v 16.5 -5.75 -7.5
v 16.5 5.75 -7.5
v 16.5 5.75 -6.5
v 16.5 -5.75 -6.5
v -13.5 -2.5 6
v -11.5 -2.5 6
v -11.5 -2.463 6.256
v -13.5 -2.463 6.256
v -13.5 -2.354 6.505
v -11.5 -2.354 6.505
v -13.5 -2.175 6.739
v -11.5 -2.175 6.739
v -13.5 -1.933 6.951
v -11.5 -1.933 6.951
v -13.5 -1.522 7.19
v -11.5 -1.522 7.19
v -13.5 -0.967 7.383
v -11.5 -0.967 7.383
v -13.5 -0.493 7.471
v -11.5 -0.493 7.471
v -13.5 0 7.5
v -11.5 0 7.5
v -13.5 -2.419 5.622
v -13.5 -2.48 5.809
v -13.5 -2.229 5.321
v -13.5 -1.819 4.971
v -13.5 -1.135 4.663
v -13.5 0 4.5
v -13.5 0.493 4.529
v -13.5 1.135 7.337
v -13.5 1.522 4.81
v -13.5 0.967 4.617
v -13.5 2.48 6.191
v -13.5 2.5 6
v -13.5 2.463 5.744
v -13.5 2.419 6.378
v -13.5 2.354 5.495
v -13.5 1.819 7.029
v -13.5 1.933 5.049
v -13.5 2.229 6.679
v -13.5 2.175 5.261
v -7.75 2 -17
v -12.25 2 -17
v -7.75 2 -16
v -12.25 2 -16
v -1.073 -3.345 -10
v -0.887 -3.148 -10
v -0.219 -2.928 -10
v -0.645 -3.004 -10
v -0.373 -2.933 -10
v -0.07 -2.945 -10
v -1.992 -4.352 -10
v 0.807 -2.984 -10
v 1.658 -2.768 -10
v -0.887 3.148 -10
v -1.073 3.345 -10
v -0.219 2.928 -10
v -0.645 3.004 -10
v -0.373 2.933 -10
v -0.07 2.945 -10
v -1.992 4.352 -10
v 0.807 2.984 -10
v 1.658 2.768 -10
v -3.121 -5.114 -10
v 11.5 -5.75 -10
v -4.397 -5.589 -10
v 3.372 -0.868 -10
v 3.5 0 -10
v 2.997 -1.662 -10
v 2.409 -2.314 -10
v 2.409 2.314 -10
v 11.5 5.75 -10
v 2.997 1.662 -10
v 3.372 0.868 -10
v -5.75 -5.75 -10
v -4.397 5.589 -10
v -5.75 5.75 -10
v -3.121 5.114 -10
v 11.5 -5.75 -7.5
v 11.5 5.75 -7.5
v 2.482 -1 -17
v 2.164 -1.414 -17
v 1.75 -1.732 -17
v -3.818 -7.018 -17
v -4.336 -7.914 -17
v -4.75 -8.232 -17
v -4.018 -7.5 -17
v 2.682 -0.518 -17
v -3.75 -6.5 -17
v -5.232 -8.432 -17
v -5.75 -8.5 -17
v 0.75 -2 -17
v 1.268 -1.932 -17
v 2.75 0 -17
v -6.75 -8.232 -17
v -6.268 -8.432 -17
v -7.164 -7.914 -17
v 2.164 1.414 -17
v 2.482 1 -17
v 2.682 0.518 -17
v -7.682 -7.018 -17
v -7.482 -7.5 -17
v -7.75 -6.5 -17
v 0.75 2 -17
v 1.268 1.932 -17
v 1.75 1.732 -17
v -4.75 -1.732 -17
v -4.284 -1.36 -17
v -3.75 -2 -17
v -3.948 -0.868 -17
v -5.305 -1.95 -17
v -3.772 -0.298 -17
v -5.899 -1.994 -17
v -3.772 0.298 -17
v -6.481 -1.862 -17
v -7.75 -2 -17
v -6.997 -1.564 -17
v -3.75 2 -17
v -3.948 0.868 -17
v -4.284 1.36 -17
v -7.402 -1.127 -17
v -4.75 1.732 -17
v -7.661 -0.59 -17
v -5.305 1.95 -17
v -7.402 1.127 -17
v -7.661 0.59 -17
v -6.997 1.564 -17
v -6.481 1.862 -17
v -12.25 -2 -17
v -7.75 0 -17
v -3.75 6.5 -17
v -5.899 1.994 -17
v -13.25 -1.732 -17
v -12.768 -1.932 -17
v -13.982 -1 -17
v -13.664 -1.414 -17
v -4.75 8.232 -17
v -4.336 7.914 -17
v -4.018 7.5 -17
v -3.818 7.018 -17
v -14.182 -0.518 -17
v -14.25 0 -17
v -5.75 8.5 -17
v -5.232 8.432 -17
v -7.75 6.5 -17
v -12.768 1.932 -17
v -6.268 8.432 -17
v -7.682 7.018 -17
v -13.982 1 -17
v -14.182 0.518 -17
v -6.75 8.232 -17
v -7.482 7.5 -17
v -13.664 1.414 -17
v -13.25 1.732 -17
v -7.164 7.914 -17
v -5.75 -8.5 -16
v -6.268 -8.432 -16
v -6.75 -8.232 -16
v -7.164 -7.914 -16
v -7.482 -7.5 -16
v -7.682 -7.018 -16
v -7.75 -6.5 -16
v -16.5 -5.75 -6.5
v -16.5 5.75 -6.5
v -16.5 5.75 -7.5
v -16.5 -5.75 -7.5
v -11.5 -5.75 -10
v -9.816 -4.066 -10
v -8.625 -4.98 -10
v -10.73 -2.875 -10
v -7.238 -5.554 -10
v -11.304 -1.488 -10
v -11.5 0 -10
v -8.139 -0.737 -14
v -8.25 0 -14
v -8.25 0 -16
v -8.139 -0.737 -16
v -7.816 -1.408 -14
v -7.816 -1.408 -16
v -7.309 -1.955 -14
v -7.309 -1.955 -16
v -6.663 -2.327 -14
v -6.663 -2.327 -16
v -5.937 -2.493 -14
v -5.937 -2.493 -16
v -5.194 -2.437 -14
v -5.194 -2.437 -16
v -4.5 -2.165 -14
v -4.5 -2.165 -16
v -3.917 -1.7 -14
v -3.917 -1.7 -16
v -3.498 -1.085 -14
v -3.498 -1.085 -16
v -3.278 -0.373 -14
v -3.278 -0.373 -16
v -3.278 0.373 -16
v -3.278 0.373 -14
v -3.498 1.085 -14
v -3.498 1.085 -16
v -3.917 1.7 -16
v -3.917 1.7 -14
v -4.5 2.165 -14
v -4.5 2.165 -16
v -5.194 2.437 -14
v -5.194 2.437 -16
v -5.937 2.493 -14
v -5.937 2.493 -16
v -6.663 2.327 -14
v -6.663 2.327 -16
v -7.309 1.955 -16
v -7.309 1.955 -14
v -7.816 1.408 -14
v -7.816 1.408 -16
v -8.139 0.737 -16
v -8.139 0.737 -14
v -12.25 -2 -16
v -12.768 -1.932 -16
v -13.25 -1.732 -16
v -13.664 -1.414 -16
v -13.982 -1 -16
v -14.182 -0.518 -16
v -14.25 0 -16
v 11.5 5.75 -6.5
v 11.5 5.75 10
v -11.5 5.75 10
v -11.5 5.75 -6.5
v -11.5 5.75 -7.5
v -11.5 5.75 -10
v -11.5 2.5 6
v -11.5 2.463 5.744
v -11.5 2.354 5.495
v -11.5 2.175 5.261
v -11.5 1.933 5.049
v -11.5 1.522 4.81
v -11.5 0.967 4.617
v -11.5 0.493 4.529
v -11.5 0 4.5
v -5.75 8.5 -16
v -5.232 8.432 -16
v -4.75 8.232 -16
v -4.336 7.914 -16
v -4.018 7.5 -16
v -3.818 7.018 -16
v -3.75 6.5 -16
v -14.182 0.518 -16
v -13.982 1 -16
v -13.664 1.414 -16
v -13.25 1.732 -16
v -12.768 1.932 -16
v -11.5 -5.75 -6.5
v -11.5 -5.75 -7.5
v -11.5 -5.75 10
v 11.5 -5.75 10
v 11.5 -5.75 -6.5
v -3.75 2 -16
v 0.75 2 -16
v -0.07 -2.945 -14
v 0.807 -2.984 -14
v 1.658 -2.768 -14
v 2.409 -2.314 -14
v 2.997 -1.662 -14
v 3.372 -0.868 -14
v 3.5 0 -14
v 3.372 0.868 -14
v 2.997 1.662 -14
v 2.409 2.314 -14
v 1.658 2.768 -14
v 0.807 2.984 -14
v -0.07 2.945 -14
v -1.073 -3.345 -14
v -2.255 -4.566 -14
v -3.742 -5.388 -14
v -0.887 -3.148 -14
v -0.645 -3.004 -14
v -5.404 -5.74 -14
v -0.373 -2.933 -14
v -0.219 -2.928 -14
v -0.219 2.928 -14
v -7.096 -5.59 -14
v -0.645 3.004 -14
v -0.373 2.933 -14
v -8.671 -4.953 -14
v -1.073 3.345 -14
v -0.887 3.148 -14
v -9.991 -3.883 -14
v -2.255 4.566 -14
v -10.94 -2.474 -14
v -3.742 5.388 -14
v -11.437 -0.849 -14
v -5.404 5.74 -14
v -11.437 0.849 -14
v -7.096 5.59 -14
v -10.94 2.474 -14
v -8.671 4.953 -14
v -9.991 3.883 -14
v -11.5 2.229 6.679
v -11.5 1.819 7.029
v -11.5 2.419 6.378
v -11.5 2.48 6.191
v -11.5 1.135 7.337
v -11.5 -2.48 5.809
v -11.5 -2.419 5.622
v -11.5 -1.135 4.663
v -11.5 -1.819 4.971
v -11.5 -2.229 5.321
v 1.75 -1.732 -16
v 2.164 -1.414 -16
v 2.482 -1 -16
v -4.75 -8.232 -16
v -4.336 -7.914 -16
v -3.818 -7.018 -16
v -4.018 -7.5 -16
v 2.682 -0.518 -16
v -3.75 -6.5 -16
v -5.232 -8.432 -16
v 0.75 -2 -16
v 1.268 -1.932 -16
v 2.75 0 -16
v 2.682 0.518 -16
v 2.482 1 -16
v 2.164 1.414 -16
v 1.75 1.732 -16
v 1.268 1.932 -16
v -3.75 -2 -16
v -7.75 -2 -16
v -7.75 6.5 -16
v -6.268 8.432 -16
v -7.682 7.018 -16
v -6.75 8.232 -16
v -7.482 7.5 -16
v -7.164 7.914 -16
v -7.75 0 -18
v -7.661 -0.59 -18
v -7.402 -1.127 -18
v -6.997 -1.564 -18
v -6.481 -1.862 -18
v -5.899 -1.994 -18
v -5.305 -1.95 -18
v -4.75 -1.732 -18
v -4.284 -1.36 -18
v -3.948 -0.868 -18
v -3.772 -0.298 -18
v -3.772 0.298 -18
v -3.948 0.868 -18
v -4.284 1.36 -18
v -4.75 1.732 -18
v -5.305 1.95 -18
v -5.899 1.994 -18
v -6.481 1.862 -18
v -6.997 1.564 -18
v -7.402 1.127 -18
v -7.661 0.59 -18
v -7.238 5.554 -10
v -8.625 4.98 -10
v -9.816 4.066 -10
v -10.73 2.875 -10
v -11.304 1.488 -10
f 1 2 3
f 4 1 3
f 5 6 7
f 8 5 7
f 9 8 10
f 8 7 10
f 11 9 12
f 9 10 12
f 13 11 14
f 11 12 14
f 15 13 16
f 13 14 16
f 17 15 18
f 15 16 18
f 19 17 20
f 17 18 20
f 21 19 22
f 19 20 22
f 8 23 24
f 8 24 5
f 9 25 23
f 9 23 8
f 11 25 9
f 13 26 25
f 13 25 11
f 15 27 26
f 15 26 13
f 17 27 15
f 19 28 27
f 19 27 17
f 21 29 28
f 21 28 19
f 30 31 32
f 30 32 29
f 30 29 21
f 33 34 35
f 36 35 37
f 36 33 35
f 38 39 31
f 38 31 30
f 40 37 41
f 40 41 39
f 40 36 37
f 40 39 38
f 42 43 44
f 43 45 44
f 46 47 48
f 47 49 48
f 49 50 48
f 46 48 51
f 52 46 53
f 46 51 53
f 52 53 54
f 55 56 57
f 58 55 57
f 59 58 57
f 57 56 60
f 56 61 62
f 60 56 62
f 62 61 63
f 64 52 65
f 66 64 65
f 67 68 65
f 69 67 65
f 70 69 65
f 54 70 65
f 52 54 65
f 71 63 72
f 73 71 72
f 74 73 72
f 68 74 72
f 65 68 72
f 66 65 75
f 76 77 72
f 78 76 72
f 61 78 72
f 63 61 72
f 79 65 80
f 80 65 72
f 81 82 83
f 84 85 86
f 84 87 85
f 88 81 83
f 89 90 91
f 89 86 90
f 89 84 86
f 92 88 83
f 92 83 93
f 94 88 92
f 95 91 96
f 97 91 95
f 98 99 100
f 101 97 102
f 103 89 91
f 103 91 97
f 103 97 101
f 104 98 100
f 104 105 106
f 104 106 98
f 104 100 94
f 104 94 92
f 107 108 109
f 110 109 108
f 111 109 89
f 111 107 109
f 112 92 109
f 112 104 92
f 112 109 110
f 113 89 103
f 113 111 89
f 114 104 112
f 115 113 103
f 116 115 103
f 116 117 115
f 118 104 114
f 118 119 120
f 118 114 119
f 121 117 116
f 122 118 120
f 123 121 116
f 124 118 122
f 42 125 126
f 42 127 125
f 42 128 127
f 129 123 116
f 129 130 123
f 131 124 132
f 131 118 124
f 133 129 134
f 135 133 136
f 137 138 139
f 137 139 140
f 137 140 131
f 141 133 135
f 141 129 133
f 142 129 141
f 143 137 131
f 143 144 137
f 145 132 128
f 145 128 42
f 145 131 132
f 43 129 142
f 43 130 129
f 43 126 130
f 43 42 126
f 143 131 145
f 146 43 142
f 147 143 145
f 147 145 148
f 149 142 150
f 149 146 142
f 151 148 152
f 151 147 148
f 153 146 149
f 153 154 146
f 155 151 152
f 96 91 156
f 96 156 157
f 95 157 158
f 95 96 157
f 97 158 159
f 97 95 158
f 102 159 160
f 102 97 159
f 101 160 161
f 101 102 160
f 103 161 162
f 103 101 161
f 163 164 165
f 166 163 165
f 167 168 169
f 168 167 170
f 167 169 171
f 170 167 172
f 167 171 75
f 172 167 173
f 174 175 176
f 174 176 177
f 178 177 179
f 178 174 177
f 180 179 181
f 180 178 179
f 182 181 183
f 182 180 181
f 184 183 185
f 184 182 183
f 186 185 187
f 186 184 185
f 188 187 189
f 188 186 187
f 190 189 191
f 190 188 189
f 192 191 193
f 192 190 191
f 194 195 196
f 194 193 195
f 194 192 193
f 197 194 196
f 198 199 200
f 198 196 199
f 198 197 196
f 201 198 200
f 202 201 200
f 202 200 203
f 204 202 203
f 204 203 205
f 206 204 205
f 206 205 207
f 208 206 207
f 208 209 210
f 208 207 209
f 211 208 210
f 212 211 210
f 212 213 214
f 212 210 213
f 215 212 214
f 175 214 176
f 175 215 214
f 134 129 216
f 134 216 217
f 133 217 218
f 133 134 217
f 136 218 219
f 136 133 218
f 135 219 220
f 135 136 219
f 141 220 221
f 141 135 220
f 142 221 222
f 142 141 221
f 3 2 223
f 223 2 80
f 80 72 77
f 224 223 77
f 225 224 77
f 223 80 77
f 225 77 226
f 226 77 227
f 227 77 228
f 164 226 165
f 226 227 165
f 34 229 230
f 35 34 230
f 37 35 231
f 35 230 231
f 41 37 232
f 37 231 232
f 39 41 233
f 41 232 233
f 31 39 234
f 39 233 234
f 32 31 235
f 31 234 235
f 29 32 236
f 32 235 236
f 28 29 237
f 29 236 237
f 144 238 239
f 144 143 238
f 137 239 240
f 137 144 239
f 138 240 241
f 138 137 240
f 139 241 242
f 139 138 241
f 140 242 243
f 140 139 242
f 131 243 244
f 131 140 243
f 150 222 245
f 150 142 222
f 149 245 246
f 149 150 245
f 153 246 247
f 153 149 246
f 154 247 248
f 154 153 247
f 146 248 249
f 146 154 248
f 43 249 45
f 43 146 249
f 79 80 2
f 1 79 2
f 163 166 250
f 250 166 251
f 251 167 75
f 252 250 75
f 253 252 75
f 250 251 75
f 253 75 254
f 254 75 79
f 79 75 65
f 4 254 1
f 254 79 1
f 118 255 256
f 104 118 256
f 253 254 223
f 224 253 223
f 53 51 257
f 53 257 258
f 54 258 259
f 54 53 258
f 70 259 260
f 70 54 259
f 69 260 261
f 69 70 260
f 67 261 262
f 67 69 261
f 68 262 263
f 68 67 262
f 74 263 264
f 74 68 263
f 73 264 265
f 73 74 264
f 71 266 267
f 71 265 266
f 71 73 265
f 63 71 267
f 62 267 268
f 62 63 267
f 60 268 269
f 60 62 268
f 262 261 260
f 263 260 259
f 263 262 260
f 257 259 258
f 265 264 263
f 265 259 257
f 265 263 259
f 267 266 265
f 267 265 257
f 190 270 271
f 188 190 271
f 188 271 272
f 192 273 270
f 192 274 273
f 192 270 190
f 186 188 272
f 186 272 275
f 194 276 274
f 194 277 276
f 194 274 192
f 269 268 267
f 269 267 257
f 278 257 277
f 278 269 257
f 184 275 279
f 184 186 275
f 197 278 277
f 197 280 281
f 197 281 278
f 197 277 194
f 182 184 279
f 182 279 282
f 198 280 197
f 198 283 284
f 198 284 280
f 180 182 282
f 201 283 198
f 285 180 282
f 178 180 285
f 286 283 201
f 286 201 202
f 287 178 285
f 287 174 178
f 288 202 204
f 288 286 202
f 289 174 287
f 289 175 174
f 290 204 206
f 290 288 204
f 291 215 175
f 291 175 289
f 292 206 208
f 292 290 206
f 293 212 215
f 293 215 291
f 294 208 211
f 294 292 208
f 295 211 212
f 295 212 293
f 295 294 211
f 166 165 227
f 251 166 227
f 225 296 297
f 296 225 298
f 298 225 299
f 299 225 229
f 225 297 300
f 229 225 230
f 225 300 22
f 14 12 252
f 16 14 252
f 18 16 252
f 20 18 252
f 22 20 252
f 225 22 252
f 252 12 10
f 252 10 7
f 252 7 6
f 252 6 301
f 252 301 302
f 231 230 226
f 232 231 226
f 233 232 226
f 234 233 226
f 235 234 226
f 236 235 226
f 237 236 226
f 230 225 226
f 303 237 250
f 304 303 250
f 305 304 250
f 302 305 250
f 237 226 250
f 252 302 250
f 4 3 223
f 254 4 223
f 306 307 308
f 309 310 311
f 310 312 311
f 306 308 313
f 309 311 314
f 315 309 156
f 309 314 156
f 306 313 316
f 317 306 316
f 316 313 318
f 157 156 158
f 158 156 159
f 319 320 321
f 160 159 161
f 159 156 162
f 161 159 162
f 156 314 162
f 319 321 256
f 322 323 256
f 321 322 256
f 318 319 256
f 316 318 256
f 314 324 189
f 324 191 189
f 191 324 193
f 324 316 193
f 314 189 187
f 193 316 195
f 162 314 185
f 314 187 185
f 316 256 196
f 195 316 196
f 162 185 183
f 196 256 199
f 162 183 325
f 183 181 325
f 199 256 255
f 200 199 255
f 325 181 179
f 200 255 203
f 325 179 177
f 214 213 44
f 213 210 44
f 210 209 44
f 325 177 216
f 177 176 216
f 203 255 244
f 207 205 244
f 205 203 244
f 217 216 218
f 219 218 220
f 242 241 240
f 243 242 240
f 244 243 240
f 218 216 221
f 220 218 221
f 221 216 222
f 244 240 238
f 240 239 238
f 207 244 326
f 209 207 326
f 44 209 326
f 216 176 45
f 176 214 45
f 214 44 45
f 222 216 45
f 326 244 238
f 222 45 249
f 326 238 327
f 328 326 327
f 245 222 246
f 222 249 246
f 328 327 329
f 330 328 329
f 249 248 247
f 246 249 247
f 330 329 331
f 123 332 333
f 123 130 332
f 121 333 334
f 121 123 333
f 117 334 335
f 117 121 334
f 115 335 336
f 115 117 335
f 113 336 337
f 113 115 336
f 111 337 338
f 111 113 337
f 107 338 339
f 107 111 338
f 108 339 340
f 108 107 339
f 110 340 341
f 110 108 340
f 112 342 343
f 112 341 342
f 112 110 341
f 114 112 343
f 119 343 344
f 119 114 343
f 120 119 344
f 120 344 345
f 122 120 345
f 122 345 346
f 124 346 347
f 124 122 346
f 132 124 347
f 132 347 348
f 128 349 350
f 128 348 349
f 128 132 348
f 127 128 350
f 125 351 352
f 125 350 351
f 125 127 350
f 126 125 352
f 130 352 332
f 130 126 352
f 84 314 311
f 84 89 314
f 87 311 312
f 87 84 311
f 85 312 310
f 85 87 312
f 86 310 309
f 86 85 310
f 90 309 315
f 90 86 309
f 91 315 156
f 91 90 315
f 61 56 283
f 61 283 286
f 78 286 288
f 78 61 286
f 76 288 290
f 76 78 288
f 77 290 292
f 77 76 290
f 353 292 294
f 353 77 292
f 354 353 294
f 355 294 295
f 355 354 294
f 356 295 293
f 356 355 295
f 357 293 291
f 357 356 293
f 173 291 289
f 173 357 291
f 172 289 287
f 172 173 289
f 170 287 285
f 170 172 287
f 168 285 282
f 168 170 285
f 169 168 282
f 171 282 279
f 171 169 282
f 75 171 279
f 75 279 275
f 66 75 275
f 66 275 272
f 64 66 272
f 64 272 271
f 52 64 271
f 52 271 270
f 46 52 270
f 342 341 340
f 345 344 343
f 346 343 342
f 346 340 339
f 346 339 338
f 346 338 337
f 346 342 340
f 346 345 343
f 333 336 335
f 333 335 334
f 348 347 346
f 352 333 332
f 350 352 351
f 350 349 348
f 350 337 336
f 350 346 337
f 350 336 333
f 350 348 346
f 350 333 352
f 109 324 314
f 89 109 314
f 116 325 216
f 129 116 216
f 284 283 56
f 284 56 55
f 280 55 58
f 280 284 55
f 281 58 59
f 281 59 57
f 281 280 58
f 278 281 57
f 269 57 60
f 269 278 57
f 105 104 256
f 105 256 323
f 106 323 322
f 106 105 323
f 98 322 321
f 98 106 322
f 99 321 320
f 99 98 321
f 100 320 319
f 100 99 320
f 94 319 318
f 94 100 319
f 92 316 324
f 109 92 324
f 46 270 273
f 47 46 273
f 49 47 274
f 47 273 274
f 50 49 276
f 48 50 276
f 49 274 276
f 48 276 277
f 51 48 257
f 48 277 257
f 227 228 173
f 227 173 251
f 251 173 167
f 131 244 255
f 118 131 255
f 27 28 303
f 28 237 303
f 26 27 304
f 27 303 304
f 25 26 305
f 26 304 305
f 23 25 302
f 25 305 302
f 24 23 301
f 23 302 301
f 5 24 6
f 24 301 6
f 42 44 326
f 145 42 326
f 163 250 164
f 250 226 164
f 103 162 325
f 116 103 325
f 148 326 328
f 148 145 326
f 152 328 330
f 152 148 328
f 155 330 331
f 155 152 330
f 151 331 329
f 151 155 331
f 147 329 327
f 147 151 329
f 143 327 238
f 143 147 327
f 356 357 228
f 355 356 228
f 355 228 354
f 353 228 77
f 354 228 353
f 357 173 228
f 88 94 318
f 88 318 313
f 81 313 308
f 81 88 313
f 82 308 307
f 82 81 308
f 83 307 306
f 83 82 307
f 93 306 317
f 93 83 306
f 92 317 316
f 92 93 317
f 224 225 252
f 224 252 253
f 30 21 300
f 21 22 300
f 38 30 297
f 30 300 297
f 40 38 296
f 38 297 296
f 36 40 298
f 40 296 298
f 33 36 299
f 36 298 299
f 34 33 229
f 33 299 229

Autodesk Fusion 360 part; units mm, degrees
sketch "Skizze1" plane through (0, 0, 0) normal (0, 0, 1) x (1, 0, 0)
  line L0 (11.5, 5.75) -> (-11.5, 5.75)
  line L1 (-11.5, 5.75) -> (-11.5, -5.75)
  line L2 (-11.5, -5.75) -> (11.5, -5.75)
  line L3 (11.5, -5.75) -> (11.5, 5.75)
  line L4 (11.5, 5.75) -> (-11.5, -5.75) construction
  line L5 (-11.5, 5.75) -> (11.5, -5.75) construction
  dimension "d1" = 11.5
  dimension "d2" = 23
extrude "Extrusion1" add sketch "Skizze1" along normal mid plane 20
sketch "Skizze2" plane through (0, 5.75, 0) normal (0, 1, 0) x (-1, 0, 0)
  line L0 (11.5, -10) -> (11.5, 10)
  line L1 (11.5, 10) -> (-11.5, 10)
  line L2 (-11.5, 10) -> (-11.5, -10)
  line L3 (-11.5, -10) -> (11.5, -10)
  line L4 (16.5, -7.5) -> (-16.5, -7.5)
  line L5 (-16.5, -7.5) -> (-16.5, -6.5)
  line L6 (-16.5, -6.5) -> (16.5, -6.5)
  line L7 (16.5, -6.5) -> (16.5, -7.5)
  dimension "d5" = 2.5
  dimension "d6" = 1
  dimension "d7" = 5
  dimension "d8" = 5
extrude "Extrusion2" add sketch "Skizze2" against normal blind 11.5 contours L0 L4 L6 L7 | L2 L4 L5 L6
sketch "Skizze3" plane through (0, 0, -10) normal (0, 0, -1) x (-1, 0, 0)
  line L0 (-11.5, 5.75) -> (-11.5, -5.75)
  line L1 (-11.5, -5.75) -> (11.5, -5.75)
  line L2 (11.5, -5.75) -> (11.5, 5.75)
  line L3 (11.5, 5.75) -> (-11.5, 5.75)
  circle A0 centre (5.75, 0) radius 5.75
  circle A1 centre (-0.5, 0) radius 3
  dimension "d11" = 11.5
  dimension "d13" = 6
  dimension "d14" = 12
extrude "Extrusion3" add sketch "Skizze3" along normal blind 4 contours A0 A1 | A0 A1 | A0 A1
fillet "Abrundung1" radius 1 2 edges at (-0.7, 2.7495, -12) (-0.7, -2.7495, -12)
sketch "Skizze4" plane through (0, 0, -14) normal (0, 0, -1) x (-1, 0, 0)
  arc A0 (1.0733, -3.3453) -> (1.0733, 3.3453) centre (5.75, 0) ccw
  arc A1 (0.07, 2.9454) -> (1.0733, 3.3453) centre (0.26, 3.9271) ccw
  arc A2 (0.07, 2.9454) -> (0.07, -2.9454) centre (-0.5, 0) ccw
  arc A3 (1.0733, -3.3453) -> (0.07, -2.9454) centre (0.26, -3.9271) ccw
  circle A4 centre (5.75, 0) radius 2.5
  dimension "d19" = 5
extrude "Extrusion4" add sketch "Skizze4" along normal blind 2 contours A4
sketch "Skizze5" plane through (0, 0, -16) normal (0, 0, -1) x (-1, 0, 0)
  circle A0 centre (5.75, 0) radius 2.5
  line L0 (7.75, 8.5) -> (3.75, 8.5)
  line L1 (3.75, -8.5) -> (7.75, -8.5)
  line L2 (7.75, 8.5) -> (3.75, -8.5) construction
  line L3 (3.75, 8.5) -> (7.75, -8.5) construction
  line L4 (-2.75, 2) -> (-2.75, -2)
  line L5 (14.25, -2) -> (14.25, 2)
  line L6 (14.25, 2) -> (-2.75, -2) construction
  line L7 (-2.75, 2) -> (14.25, -2) construction
  line L8 (3.75, 2) -> (-2.75, 2)
  line L9 (3.75, 8.5) -> (3.75, 2)
  line L10 (3.75, 0.4706) -> (3.75, -0.4706)
  line L11 (3.75, -2) -> (3.75, -8.5)
  line L12 (-2.75, -2) -> (3.75, -2)
  line L13 (7.75, -2) -> (14.25, -2)
  line L14 (7.75, -8.5) -> (7.75, -2)
  line L15 (7.75, -0.4706) -> (7.75, 0.4706)
  line L16 (7.75, 2) -> (7.75, 8.5)
  line L17 (14.25, 2) -> (7.75, 2)
  line L18 (6.2206, 2) -> (5.2794, 2)
  point P0 (5.75, 0)
  point P1 (5.75, 0)
  dimension "d22" = 4
  dimension "d23" = 17
extrude "Extrusion5" add sketch "Skizze5" along normal blind 1 contours A0 | L0 L1 L4 L5 L8 L9 L11 L12 L13 L14 L16 L17
fillet "Abrundung2" radius 2 8 edges at (2.75, -2, -16.5) (-3.75, -8.5, -16.5) (-7.75, -8.5, -16.5) (-14.25, -2, -16.5) (-14.25, 2, -16.5) (-7.75, 8.5, -16.5) (-3.75, 8.5, -16.5) (2.75, 2, -16.5)
sketch "Skizze6" plane through (0, 0, -17) normal (0, 0, -1) x (-1, 0, 0)
  arc A0 (-0.75, 2) -> (-0.75, -2) centre (-0.75, 0) ccw
  line L0 (-0.75, -2) -> (3.75, -2)
  line L1 (3.75, -2) -> (3.75, -6.5)
  arc A1 (3.75, -6.5) -> (7.75, -6.5) centre (5.75, -6.5) ccw
  line L2 (7.75, -6.5) -> (7.75, -2)
  line L3 (7.75, -2) -> (12.25, -2)
  arc A2 (12.25, -2) -> (12.25, 2) centre (12.25, 0) ccw
  line L4 (12.25, 2) -> (7.75, 2)
  line L5 (7.75, 2) -> (7.75, 6.5)
  arc A3 (7.75, 6.5) -> (3.75, 6.5) centre (5.75, 6.5) ccw
  line L6 (3.75, 6.5) -> (3.75, 2)
  line L7 (3.75, 2) -> (-0.75, 2)
  line L8 (5.75, 6.5) -> (5.75, -6.5) construction
  line L9 (12.25, 0) -> (-0.75, 0) construction
  circle A4 centre (5.75, 0) radius 2
  dimension "d28" = 4
extrude "Extrusion6" add sketch "Skizze6" along normal blind 1 contours A4
sketch "Skizze7" plane through (-11.5, 0, 0) normal (-1, 0, 0) x (0, 0, 1)
  line L0 (-6.5, 5.75) -> (-6.5, -5.75)
  line L1 (-6.5, -5.75) -> (10, -5.75)
  line L2 (10, -5.75) -> (10, 5.75)
  line L3 (10, 5.75) -> (-6.5, 5.75)
  ellipse E0 centre (6, 0) end of major axis (6, 2.5) minor radius 1.5
  line L4 (6, -2.5) -> (6, 2.5)
  line L5 (7.5, 0) -> (4.5, 0)
  dimension "d31" = 5
  dimension "d32" = 3
  dimension "d33" = 4
extrude "Extrusion7" add sketch "Skizze7" along normal blind 2 contours E0 L4 L5 | E0 L4 L5 | E0 L4 L5 | E0 L4 L5
equation "d8 = d7"
